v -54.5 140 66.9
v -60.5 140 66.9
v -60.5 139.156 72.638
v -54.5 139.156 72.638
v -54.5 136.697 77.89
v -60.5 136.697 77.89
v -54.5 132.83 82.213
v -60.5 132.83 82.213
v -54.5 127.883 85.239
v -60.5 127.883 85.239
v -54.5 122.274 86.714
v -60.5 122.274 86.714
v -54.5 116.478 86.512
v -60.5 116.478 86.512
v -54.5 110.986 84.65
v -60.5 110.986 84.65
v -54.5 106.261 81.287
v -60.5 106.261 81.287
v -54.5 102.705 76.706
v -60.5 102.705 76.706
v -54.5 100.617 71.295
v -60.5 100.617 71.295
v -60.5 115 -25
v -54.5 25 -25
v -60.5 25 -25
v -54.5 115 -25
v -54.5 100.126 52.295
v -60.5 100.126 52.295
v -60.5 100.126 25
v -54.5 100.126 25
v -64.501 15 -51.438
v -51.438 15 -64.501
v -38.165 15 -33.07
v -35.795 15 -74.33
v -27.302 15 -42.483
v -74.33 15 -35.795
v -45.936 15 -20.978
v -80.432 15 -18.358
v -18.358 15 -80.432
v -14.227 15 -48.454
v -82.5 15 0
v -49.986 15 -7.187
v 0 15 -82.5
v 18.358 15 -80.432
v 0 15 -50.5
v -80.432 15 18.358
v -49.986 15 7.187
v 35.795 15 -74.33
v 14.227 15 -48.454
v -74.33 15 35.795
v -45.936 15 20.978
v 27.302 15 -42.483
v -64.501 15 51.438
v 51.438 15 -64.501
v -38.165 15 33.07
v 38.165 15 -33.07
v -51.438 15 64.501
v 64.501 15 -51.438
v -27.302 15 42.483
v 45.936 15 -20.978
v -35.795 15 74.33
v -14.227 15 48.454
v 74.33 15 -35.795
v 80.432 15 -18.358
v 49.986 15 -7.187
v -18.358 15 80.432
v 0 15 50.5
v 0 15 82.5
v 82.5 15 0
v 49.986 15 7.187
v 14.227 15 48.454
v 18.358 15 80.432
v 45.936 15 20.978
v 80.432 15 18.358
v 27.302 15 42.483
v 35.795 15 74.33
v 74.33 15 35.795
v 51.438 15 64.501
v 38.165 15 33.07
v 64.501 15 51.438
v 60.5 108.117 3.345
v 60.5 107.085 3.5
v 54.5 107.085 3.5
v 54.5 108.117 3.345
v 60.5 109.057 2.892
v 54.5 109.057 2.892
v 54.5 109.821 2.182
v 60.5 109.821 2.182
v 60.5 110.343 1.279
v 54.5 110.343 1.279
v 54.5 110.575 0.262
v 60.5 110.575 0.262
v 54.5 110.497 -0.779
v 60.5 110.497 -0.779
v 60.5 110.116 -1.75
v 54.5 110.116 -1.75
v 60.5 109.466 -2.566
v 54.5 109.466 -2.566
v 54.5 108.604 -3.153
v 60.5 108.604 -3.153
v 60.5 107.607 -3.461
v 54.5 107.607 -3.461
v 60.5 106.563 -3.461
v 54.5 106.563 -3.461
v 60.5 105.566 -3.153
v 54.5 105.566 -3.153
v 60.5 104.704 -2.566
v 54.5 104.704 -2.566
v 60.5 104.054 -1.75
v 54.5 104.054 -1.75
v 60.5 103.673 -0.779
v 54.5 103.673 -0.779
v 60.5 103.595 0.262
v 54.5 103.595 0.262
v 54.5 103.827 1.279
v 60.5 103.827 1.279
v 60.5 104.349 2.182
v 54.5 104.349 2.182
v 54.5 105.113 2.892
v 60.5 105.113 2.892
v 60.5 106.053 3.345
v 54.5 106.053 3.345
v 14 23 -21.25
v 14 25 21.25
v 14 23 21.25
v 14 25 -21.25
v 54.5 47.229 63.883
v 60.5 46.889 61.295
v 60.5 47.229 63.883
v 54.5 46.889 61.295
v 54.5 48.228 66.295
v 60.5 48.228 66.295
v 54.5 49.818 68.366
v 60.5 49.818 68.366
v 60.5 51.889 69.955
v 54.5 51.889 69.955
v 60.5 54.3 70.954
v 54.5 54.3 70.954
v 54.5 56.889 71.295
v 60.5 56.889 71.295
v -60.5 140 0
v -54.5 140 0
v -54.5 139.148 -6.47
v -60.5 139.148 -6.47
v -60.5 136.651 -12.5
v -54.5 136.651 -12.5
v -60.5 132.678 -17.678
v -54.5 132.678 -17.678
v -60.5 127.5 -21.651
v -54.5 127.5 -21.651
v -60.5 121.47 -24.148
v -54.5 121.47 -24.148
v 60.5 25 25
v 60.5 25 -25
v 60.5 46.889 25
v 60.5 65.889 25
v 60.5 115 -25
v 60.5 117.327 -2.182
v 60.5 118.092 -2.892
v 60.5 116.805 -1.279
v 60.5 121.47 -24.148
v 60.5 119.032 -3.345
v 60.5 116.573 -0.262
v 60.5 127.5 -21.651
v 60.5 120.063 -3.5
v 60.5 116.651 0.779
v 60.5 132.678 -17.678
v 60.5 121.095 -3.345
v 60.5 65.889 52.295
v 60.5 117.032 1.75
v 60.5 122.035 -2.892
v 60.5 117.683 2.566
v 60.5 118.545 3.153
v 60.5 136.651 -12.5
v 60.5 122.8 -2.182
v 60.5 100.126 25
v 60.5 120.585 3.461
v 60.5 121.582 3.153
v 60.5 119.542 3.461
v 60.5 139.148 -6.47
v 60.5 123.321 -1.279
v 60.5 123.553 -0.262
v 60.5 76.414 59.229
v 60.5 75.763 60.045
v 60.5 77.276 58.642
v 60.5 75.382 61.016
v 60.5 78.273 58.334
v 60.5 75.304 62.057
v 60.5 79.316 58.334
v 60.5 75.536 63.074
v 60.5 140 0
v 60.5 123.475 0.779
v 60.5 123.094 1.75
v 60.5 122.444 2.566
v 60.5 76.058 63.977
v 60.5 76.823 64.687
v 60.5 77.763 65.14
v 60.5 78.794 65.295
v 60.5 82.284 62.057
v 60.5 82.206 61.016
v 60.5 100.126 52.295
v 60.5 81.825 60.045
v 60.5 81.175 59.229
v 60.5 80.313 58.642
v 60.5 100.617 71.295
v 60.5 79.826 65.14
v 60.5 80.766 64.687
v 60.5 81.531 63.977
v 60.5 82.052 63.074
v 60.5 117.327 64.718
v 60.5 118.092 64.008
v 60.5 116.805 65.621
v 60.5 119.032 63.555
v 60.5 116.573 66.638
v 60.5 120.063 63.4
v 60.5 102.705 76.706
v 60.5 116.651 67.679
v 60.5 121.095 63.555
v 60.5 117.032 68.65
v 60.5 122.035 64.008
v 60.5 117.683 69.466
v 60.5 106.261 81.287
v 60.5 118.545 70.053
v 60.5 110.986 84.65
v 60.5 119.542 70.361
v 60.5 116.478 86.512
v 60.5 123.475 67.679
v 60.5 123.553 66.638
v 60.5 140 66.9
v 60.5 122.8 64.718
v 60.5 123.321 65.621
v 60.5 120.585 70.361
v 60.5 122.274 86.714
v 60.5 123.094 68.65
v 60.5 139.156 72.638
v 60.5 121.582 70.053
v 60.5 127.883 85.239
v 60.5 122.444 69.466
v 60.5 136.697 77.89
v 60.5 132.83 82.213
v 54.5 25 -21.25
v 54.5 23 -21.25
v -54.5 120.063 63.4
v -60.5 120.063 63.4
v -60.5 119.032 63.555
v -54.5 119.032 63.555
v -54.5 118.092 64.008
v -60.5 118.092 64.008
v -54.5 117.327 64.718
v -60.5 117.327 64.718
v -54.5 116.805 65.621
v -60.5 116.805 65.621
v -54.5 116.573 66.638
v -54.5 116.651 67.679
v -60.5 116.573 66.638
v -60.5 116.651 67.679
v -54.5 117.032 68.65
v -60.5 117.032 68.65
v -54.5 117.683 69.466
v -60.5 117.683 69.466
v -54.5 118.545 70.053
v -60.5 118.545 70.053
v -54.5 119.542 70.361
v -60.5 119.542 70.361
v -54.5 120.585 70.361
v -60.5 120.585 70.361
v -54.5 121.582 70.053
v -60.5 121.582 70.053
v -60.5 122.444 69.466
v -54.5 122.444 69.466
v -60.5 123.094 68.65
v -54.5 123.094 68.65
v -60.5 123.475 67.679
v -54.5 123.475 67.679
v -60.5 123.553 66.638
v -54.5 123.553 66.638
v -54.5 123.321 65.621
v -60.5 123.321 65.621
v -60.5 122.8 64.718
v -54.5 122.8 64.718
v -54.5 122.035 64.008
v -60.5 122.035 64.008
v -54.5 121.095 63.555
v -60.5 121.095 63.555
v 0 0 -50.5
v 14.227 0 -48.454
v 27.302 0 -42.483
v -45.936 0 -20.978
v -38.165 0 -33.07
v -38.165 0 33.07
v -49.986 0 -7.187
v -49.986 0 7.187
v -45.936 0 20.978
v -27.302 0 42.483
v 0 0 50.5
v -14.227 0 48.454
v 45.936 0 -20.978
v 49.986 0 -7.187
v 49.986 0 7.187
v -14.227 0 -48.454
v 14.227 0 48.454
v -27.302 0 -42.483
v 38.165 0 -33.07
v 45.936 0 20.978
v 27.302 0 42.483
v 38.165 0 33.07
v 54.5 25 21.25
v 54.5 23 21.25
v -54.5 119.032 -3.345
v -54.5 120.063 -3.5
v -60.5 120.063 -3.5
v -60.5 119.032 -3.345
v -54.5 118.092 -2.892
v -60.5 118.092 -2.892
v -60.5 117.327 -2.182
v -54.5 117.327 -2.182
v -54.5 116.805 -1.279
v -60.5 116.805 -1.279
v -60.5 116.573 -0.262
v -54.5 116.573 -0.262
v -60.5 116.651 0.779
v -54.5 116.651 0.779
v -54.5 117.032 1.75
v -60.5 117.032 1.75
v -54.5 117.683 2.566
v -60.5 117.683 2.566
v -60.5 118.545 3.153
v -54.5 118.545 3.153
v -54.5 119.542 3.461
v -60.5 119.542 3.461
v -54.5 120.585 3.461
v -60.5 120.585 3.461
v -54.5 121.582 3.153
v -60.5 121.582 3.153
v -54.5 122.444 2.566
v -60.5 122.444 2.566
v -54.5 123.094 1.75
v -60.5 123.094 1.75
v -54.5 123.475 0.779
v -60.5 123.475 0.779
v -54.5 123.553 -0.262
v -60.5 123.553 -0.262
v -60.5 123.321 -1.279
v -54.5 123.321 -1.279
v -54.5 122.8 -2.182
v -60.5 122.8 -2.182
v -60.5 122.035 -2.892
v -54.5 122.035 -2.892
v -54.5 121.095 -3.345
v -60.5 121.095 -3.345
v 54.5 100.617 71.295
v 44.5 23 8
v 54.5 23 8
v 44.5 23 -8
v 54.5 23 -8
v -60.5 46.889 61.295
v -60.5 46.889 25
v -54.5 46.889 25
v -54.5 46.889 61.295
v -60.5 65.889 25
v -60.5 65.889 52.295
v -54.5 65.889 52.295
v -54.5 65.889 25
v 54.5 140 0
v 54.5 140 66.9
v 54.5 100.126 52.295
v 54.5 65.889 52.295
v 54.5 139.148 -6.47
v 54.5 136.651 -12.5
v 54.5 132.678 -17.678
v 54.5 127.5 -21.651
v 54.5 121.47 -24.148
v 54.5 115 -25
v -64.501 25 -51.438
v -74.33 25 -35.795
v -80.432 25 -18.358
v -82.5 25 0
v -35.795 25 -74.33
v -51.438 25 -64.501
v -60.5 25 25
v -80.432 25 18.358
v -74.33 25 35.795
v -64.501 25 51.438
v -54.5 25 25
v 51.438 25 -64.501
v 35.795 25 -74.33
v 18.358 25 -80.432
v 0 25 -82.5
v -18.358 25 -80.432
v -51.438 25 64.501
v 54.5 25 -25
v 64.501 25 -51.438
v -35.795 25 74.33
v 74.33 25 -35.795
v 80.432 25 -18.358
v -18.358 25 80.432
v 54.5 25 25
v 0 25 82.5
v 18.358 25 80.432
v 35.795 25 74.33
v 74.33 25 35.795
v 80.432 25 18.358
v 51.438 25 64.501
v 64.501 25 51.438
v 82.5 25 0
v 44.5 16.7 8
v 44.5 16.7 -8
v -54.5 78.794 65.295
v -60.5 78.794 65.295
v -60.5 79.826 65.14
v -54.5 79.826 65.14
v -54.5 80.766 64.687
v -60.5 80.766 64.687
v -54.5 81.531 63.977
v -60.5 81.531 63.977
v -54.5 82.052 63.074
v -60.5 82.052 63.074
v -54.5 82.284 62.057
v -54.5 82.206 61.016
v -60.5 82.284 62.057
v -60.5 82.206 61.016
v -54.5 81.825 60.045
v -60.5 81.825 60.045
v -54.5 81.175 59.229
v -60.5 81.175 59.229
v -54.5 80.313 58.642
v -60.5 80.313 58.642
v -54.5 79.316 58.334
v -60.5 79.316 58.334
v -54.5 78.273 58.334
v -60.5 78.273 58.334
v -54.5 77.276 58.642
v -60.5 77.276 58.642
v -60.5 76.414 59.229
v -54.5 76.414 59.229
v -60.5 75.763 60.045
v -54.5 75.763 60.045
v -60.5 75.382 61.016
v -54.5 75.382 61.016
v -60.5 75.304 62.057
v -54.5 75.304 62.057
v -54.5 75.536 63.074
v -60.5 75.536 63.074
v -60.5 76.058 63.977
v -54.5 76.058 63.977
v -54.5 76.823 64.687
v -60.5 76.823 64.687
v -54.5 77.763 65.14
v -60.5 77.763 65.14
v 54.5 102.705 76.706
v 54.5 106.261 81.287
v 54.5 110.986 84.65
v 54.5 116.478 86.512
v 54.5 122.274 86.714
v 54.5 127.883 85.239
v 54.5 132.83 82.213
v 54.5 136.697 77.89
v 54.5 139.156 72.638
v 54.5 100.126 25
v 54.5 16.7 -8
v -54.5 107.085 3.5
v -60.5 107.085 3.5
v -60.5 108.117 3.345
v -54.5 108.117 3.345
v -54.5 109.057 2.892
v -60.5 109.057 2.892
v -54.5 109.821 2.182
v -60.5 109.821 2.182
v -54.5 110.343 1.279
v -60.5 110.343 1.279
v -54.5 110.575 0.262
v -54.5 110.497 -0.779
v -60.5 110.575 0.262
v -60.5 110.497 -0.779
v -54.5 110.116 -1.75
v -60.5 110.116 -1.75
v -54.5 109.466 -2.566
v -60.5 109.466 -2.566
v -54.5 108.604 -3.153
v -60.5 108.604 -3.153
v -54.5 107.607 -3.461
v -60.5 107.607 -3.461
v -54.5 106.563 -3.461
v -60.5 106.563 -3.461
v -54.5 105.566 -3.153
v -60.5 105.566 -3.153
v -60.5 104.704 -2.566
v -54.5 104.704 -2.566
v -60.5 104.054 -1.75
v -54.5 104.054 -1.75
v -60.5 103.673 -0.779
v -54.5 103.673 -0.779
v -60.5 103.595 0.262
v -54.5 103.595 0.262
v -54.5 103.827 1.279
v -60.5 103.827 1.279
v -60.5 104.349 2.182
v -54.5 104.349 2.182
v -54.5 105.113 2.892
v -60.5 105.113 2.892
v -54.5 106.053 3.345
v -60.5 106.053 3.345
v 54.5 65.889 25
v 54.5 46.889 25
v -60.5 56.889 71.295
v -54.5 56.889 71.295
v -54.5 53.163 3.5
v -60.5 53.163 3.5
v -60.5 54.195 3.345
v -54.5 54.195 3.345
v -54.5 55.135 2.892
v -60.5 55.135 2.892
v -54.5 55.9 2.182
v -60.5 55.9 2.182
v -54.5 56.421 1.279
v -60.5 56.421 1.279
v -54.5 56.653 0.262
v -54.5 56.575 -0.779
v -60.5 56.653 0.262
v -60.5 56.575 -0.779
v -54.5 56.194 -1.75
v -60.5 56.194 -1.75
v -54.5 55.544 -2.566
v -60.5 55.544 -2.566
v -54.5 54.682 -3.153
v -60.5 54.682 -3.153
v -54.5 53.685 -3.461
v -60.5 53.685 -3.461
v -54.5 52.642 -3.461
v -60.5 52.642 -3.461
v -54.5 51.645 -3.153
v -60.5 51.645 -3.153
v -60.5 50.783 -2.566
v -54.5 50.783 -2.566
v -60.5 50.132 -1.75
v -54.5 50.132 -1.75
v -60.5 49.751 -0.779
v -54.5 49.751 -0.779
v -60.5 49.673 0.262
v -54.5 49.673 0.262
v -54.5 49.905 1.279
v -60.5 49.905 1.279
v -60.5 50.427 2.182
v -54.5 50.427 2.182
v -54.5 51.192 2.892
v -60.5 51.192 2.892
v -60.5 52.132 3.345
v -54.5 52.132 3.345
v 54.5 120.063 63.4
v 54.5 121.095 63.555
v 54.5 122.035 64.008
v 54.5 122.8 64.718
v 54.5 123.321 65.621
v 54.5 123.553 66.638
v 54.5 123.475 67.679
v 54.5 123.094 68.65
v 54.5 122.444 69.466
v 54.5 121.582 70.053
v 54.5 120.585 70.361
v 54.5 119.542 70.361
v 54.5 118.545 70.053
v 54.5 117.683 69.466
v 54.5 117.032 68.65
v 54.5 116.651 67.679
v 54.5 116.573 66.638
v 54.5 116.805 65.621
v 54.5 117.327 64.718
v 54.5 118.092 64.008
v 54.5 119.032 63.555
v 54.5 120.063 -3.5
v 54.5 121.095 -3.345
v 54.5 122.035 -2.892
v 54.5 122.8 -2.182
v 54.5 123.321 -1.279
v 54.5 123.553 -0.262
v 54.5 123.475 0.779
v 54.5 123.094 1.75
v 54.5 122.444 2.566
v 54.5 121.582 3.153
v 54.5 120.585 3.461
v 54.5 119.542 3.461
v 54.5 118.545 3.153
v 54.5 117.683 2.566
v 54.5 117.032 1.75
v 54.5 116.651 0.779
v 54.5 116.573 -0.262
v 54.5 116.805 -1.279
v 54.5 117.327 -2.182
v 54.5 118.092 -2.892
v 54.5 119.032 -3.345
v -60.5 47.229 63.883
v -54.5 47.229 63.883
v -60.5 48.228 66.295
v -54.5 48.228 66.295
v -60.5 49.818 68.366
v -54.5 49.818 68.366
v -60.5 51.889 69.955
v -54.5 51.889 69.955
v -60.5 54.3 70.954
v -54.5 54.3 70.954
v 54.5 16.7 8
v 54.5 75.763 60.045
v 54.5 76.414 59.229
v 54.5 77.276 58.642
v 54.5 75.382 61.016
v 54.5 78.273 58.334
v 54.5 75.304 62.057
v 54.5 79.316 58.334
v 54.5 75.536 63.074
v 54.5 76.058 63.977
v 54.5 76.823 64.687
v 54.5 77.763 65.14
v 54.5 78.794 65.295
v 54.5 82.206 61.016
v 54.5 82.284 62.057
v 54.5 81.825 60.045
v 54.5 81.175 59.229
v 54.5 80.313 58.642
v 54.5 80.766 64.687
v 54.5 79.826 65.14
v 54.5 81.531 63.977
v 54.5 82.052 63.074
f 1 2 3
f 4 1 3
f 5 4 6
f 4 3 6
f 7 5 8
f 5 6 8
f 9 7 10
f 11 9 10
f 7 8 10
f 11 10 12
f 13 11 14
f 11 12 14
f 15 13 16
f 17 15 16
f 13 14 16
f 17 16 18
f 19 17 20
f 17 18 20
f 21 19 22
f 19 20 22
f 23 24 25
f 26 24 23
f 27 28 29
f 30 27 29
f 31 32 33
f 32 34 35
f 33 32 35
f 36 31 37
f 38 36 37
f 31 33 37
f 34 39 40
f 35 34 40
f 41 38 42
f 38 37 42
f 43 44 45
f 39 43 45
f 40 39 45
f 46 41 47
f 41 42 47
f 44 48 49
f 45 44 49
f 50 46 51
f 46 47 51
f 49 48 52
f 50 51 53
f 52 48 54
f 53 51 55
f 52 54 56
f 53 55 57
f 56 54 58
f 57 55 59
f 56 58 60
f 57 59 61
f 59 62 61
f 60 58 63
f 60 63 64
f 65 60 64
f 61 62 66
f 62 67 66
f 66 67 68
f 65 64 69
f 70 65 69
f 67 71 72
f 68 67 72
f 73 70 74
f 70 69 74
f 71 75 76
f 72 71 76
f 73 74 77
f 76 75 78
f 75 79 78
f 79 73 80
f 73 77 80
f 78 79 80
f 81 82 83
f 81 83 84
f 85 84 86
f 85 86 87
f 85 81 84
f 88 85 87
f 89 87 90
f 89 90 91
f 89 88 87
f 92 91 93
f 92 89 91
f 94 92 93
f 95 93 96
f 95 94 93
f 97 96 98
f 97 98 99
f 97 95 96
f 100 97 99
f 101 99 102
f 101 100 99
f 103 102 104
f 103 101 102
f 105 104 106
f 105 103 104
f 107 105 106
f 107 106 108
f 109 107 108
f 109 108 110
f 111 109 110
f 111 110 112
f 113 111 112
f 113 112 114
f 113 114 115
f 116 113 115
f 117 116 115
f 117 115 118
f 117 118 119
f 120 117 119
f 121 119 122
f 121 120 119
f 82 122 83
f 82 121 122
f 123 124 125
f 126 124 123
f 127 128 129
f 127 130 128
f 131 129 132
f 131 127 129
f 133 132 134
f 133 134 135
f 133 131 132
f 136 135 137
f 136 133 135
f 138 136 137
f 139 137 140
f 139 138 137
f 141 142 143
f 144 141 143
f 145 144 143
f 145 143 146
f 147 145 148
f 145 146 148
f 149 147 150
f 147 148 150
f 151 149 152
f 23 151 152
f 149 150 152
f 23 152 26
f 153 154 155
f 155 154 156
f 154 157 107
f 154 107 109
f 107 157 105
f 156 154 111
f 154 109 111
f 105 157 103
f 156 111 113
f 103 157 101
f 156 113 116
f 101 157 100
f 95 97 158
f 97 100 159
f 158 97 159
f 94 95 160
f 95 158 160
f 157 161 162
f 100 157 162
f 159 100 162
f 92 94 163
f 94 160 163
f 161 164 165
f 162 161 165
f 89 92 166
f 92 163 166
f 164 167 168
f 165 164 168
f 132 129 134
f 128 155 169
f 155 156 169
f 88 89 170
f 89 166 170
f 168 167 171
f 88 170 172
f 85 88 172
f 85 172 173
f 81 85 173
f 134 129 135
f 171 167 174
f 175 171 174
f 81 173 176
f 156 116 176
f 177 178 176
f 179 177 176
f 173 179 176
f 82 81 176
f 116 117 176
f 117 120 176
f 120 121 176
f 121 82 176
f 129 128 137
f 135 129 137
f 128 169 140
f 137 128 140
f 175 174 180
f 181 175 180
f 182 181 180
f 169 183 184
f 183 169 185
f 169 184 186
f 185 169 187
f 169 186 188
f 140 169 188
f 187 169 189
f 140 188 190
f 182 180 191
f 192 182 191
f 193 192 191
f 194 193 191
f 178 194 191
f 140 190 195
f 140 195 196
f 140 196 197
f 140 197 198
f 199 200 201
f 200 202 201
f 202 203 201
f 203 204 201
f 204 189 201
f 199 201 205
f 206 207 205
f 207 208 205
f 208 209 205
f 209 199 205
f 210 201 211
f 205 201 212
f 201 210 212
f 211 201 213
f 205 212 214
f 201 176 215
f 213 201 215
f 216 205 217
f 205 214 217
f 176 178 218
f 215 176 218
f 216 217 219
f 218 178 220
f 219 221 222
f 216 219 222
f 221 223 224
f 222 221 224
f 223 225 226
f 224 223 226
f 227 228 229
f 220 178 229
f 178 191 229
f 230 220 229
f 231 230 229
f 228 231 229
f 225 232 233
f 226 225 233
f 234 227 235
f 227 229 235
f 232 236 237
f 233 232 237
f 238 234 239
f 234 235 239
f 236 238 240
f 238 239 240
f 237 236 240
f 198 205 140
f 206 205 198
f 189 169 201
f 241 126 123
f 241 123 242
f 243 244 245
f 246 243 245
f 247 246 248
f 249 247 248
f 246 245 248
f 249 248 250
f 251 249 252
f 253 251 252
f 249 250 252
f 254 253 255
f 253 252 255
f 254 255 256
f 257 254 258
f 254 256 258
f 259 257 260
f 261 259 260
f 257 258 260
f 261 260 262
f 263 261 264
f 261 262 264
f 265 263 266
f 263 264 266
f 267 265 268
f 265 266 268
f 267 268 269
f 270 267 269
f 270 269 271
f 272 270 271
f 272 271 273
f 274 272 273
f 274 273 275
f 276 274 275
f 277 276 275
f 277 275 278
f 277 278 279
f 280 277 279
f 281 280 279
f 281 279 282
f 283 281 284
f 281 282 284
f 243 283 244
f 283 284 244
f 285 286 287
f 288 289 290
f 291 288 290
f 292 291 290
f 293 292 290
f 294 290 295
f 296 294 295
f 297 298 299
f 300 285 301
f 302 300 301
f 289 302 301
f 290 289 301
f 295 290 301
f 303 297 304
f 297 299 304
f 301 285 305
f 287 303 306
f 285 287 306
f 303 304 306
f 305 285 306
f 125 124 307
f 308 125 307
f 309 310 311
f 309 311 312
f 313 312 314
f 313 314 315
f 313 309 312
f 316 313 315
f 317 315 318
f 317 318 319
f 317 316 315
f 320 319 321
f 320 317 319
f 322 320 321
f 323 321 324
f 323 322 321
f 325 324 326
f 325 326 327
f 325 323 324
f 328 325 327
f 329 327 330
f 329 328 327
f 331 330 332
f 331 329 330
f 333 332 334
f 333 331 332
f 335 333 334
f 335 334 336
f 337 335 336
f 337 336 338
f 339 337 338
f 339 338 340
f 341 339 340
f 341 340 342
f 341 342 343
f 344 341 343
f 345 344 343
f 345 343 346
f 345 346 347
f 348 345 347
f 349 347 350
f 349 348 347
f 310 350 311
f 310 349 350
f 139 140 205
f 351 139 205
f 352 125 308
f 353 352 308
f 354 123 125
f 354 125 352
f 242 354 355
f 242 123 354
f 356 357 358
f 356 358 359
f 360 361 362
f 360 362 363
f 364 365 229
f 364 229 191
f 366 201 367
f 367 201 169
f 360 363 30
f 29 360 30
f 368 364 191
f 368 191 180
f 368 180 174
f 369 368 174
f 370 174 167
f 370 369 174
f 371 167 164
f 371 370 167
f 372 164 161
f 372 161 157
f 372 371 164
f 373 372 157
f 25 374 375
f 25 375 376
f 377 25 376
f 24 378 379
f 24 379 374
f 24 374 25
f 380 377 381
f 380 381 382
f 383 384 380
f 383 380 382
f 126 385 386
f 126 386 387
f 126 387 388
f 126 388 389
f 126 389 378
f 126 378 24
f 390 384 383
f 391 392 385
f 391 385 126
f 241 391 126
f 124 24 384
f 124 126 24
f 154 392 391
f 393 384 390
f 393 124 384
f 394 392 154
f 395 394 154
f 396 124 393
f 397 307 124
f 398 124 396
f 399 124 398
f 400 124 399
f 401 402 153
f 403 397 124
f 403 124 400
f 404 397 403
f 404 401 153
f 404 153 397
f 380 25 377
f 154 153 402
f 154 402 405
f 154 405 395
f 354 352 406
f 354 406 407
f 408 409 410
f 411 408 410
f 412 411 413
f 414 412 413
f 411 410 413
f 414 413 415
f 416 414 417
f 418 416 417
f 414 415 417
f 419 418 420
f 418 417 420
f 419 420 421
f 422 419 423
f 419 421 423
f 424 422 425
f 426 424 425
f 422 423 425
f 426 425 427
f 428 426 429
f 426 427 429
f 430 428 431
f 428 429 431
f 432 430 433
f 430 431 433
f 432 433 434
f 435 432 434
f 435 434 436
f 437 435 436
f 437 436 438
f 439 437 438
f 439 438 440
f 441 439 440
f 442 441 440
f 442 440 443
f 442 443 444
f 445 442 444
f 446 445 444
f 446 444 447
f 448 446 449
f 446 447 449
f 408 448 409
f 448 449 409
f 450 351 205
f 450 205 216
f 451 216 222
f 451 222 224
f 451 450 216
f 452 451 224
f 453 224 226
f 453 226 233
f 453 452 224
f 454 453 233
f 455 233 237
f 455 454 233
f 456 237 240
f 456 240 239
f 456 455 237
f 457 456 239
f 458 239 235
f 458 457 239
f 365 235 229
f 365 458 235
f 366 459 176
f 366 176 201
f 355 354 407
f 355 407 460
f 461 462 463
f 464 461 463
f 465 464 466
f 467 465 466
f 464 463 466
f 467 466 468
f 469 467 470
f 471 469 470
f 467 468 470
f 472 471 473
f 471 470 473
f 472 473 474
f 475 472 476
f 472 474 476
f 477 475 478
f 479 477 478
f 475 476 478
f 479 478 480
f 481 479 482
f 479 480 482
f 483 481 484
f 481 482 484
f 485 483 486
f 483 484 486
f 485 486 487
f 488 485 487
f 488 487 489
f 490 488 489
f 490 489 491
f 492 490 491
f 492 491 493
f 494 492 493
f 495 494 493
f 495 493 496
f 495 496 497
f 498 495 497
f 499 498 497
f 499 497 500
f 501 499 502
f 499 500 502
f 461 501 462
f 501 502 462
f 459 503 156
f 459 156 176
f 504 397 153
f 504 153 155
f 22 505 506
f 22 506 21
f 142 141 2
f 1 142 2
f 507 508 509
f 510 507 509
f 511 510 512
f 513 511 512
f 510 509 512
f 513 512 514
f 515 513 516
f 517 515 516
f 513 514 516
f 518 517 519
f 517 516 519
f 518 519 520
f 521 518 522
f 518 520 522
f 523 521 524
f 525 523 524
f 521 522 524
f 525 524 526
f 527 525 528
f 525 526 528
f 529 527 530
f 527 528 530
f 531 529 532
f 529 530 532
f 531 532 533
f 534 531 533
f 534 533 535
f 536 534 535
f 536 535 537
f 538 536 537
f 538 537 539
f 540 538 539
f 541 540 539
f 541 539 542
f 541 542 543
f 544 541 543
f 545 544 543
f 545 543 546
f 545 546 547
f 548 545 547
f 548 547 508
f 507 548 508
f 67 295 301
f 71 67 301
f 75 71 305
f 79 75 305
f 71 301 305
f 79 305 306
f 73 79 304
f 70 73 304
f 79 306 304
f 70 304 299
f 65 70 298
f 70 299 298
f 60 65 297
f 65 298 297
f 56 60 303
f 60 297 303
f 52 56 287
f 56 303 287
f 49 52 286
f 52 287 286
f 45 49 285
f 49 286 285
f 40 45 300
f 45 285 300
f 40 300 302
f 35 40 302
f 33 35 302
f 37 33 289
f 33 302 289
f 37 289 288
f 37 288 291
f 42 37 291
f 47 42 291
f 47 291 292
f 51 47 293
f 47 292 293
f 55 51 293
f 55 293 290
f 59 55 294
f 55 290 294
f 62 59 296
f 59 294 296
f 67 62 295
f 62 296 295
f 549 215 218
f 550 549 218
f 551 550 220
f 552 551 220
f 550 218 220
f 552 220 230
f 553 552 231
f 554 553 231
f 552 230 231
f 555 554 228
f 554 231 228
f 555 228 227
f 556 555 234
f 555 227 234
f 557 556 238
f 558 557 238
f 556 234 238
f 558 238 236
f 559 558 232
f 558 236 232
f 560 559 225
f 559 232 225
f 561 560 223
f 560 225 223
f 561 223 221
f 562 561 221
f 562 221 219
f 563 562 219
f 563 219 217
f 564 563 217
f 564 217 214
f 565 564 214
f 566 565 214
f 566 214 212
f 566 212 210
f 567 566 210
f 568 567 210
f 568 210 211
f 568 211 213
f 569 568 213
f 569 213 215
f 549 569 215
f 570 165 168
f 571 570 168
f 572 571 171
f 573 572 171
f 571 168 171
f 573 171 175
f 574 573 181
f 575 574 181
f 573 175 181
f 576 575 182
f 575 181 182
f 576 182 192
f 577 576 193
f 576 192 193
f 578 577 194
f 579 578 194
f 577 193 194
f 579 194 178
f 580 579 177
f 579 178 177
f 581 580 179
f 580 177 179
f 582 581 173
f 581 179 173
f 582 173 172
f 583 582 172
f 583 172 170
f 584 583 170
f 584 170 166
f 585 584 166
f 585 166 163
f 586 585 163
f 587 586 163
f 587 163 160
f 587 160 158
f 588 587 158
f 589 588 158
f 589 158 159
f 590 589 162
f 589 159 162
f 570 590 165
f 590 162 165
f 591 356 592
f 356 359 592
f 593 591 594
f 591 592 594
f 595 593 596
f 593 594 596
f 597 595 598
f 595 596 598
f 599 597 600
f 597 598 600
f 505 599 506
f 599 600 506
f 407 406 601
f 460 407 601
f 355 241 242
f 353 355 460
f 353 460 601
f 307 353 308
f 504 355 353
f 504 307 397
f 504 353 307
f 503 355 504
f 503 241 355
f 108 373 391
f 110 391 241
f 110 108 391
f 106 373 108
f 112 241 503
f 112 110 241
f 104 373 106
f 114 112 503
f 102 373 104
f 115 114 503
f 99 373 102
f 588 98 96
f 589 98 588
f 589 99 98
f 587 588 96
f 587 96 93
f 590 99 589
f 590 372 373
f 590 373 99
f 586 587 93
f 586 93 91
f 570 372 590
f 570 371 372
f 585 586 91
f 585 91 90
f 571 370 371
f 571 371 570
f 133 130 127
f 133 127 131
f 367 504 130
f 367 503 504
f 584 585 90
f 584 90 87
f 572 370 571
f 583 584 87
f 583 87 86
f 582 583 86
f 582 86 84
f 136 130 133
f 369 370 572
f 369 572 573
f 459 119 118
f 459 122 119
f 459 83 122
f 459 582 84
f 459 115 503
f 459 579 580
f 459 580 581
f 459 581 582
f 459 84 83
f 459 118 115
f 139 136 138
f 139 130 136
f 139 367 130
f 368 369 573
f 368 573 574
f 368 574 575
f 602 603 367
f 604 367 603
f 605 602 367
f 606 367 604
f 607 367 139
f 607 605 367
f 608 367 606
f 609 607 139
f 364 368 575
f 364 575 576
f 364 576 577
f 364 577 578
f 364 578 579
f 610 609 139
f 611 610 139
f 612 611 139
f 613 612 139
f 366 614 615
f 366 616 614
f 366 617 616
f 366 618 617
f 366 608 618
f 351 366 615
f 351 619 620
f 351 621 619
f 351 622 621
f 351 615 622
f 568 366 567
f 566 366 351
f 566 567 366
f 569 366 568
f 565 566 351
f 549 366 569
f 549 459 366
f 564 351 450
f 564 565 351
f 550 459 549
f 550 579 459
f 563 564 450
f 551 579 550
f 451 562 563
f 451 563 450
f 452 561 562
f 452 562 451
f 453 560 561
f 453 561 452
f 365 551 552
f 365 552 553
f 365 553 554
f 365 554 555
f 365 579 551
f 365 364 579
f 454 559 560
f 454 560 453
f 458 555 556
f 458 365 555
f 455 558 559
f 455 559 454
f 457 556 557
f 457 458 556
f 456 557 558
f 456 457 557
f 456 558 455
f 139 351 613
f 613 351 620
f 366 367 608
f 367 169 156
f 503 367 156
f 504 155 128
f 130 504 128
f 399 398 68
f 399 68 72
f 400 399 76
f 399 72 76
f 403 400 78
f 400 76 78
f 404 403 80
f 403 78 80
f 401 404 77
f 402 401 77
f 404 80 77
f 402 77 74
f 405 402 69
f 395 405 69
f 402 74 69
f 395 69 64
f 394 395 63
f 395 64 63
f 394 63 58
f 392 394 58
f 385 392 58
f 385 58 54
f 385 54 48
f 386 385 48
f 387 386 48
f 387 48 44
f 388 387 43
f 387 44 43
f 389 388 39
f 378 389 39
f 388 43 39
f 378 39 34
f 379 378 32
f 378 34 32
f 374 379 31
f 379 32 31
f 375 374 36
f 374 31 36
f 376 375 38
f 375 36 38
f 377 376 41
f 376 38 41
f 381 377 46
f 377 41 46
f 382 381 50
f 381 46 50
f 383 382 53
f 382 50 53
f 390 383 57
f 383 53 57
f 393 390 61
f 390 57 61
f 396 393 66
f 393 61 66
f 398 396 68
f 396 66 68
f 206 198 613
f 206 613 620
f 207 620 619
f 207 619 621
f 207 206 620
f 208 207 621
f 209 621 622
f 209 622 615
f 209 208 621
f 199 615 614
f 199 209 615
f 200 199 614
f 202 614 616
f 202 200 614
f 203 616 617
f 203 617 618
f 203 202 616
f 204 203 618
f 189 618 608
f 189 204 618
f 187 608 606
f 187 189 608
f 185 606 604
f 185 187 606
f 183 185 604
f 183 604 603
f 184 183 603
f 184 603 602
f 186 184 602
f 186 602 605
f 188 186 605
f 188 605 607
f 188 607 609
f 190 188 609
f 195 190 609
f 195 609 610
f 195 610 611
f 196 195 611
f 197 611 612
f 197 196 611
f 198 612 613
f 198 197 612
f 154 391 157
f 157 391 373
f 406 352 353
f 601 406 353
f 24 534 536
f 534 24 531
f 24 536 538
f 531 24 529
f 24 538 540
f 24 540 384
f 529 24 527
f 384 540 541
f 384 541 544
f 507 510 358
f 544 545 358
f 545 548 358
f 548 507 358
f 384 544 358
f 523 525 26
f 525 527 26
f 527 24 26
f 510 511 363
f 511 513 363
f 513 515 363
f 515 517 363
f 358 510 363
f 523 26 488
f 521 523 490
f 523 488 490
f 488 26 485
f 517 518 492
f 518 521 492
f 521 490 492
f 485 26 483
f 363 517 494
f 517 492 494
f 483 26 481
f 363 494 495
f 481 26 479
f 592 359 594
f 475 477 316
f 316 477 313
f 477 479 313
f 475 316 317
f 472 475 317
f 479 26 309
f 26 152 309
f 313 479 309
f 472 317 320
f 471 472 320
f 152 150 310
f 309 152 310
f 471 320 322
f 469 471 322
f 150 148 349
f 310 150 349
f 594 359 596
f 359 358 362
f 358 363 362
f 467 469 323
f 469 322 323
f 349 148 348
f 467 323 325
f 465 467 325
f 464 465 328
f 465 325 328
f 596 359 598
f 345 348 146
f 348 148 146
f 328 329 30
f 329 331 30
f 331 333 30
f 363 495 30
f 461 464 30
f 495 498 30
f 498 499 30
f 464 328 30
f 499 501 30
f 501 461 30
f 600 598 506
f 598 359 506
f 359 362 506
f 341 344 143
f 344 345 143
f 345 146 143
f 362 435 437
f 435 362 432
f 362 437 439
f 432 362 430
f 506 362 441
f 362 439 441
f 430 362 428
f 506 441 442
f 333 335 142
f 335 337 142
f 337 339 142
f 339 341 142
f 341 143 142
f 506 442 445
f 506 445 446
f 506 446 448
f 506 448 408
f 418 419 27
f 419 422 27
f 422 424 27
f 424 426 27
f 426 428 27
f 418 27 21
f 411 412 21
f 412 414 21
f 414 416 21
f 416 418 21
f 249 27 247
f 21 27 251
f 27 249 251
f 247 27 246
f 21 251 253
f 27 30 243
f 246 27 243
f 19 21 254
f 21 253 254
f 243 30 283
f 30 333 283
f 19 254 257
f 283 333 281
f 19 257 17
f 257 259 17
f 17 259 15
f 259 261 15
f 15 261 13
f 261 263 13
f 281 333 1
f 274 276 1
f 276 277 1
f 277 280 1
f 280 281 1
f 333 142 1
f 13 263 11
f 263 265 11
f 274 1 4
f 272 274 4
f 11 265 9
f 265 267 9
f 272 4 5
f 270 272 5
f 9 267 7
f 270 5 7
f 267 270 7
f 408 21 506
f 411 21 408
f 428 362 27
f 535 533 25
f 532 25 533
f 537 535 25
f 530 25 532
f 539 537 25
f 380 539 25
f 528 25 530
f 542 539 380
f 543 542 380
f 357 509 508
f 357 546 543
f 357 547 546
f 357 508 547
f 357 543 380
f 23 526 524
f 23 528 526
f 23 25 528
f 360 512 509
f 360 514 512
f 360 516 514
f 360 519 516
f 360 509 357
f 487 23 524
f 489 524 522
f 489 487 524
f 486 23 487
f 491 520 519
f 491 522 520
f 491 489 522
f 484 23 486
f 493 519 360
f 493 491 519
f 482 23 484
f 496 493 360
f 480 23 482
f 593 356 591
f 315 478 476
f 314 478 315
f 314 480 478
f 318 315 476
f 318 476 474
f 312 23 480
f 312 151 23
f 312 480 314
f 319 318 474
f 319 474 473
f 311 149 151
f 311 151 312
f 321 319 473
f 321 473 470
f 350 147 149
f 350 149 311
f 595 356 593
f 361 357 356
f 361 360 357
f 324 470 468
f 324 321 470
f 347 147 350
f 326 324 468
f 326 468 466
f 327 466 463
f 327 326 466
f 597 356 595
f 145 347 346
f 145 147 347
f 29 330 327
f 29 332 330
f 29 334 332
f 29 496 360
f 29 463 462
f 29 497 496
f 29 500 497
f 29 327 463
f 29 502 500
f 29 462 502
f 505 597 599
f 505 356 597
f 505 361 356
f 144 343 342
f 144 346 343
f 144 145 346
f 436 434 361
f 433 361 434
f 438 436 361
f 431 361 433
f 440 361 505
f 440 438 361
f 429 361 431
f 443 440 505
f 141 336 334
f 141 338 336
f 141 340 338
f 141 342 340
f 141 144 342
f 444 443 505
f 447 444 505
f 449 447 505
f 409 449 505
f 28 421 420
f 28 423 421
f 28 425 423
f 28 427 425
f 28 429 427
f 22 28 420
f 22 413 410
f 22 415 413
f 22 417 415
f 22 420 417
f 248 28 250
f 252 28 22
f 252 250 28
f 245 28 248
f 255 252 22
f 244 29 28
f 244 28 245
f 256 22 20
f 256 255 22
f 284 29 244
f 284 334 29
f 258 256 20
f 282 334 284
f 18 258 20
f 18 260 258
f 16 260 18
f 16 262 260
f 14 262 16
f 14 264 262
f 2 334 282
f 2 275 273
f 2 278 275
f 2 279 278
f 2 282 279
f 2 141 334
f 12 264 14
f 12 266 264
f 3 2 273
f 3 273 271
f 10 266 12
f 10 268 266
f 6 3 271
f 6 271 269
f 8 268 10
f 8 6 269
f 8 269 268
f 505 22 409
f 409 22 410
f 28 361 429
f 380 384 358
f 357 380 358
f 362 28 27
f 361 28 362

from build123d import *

# Parameters (mm, degrees)
ESQUISSE1_R             = 50.5
BOSS_EXTRU_1_DEPTH      = 15
ESQUISSE2_R             = 82.5
BOSS_EXTRU_2_DEPTH      = 10
ESQUISSE3_W             = 40.5
ESQUISSE3_H             = 42.5
ENL_V_MAT_EXTRU_1_DEPTH = 2
ESQUISSE4_W             = 10
ESQUISSE4_H             = 16
ENL_V_MAT_EXTRU_2_DEPTH = 6.3
ESQUISSE5_W             = 50
ESQUISSE5_H             = 90
BOSS_EXTRU_3_DEPTH      = 6
BOSS_EXTRU_4_DEPTH      = 6
ESQUISSE7_R             = 3.5
ENL_V_MAT_EXTRU_3_DEPTH = 10
ESQUISSE8_R             = 3.5
ENL_V_MAT_EXTRU_4_DEPTH = 6
ESQUISSE9_R             = 3.5
BOSS_EXTRU_5_DEPTH      = 6
ENL_V_START             = -6
ESQUISSE10_R            = 3.5
ENL_V_MAT_EXTRU_5_DEPTH = 6
ESQUISSE13_R            = 3.5
ENL_V_MAT_EXTRU_6_DEPTH = 10
ESQUISSE17_R            = 3.5
ENL_V_MAT_EXTRU_7_DEPTH = 6
ESQUISSE19_R            = 3.5
BOSS_EXTRU_8_DEPTH      = 6
CONG_1_R                = 10
CONG_1_OF_SYM_TRIE4_R   = 10


with BuildPart() as part:
    # Esquisse1 → Boss.-Extru.1 (new body)
    with BuildSketch(Plane(origin=(0, 0, 0), x_dir=(1, 0, 0), z_dir=(0, 1, 0))):
        with Locations(Location((0, 0, 0), (0, 0, 270))):
            Circle(ESQUISSE1_R)
    extrude(amount=BOSS_EXTRU_1_DEPTH)

    # Esquisse2 → Boss.-Extru.2 (add)
    with BuildSketch(Plane(origin=(0, 15, 0), x_dir=(1, 0, 0), z_dir=(0, 1, 0))):
        with Locations(Location((0, 0, 0), (0, 0, 270))):
            Circle(ESQUISSE2_R)
    extrude(amount=BOSS_EXTRU_2_DEPTH)

    # Esquisse3 → Enlèv. mat.-Extru.1 (cut)
    with BuildSketch(Plane(origin=(0, 25, 0), x_dir=(1, 0, 0), z_dir=(0, 1, 0))):
        with Locations((34.25, 0)):
            Rectangle(ESQUISSE3_W, ESQUISSE3_H)
    extrude(amount=-ENL_V_MAT_EXTRU_1_DEPTH, mode=Mode.SUBTRACT)

    # Esquisse4 → Enlèv. mat.-Extru.2 (cut)
    with BuildSketch(Plane(origin=(0, 23, 0), x_dir=(1, 0, 0), z_dir=(0, 1, 0))):
        with Locations((49.5, 0)):
            Rectangle(ESQUISSE4_W, ESQUISSE4_H)
    extrude(amount=-ENL_V_MAT_EXTRU_2_DEPTH, mode=Mode.SUBTRACT)

    # Esquisse5 → Boss.-Extru.3 (add)
    with BuildSketch(Plane.ZY.offset(-54.5)):
        with Locations((0, 70)):
            Rectangle(ESQUISSE5_W, ESQUISSE5_H)
        with BuildLine():
            ThreePointArc((25, 115), (0, 140), (-25, 115))
            Line((-25, 115), (25, 115))
        make_face()
    boss_extru_3 = extrude(amount=-BOSS_EXTRU_3_DEPTH)

    # Symétrie1: Boss.-Extru.3 across plane
    add(boss_extru_3.mirror(Plane(origin=(0, 0, 0), x_dir=(0, 0, 1), z_dir=(1, 0, 0))))

    # Esquisse6 → Boss.-Extru.4 (add)
    with BuildSketch(Plane.ZY.offset(-54.5)):
        with BuildLine():
            Line((66.9, 140), (0, 140))
            ThreePointArc((0, 140), (17.67766953, 132.67766953), (25, 115))
            Line((25, 115), (25, 100.126441606))
            Line((25, 100.126441606), (66.9, 100.126441606))
            Line((66.9, 100.126441606), (66.9, 140))
        make_face()
        with BuildLine():
            Line((66.9, 140), (66.9, 100.126441606))
            ThreePointArc((66.9, 100.126441606), (86.836779197, 120.063220803), (66.9, 140))
        make_face()
    extrude(amount=-BOSS_EXTRU_4_DEPTH)

    # Esquisse7 → Enlèv. mat.-Extru.3 (cut)
    with BuildSketch(Plane(origin=(60.5, 0, 0), x_dir=(0, 0, -1), z_dir=(1, 0, 0))):
        with Locations((-66.9, 120.063220803)):
            Circle(ESQUISSE7_R)
    extrude(amount=-ENL_V_MAT_EXTRU_3_DEPTH, mode=Mode.SUBTRACT)

    # Esquisse8 → Enlèv. mat.-Extru.4 (cut)
    with BuildSketch(Plane(origin=(60.5, 0, 0), x_dir=(0, 0, -1), z_dir=(1, 0, 0))):
        with Locations((0, 120.063220803)):
            Circle(ESQUISSE8_R)
    extrude(amount=-ENL_V_MAT_EXTRU_4_DEPTH, mode=Mode.SUBTRACT)

    # Esquisse9 → Boss.-Extru.5 (add)
    with BuildSketch(Plane.ZY.offset(60.5)):
        with BuildLine():
            Line((0, 140), (66.9, 140))
            ThreePointArc((66.9, 140), (86.836779197, 120.063220803), (66.9, 100.126441606))
            Line((66.9, 100.126441606), (25, 100.126441606))
            Line((25, 100.126441606), (25, 115))
            ThreePointArc((25, 115), (17.67766953, 132.67766953), (0, 140))
        make_face()
        with Locations(Location((66.9, 120.063220803, 0), (0, 0, 180))):
            Circle(ESQUISSE9_R, mode=Mode.SUBTRACT)
    extrude(amount=-BOSS_EXTRU_5_DEPTH)

    # Esquisse10 → Enlèv. mat.-Extru.5 (cut)
    with BuildSketch(Plane.ZY.offset(60.5).offset(ENL_V_START)):
        with Locations(Location((0, 120.063220803, 0), (0, 0, 180))):
            Circle(ESQUISSE10_R)
    extrude(amount=ENL_V_MAT_EXTRU_5_DEPTH, mode=Mode.SUBTRACT)

    # Esquisse13 → Enlèv. mat.-Extru.6 (cut)
    with BuildSketch(Plane.ZY.offset(60.5)):
        with Locations((0, 53.163220803)):
            Circle(ESQUISSE13_R)
    extrude(amount=-ENL_V_MAT_EXTRU_6_DEPTH, mode=Mode.SUBTRACT)

    # Esquisse17 → Enlèv. mat.-Extru.7 (cut)
    with BuildSketch(Plane.ZY.offset(60.5)):
        with Locations((0, 107.085063293)):
            Circle(ESQUISSE17_R)
    enl_v_mat_extru_7 = extrude(amount=-ENL_V_MAT_EXTRU_7_DEPTH, mode=Mode.SUBTRACT)

    # Esquisse19 → Boss.-Extru.8 (add)
    # profile 1 of 2: a face of its own
    with BuildSketch(Plane.ZY.offset(60.5)):
        with Locations((0, 61.406086298)):
            Circle(ESQUISSE19_R)
    # profile 2 of 2: a face of its own
    with BuildSketch(Plane.ZY.offset(60.5)):
        with BuildLine():
            Line((25, 46.888681), (71.2950306, 46.888681))
            Line((71.2950306, 46.888681), (71.2950306, 100.616913422))
            ThreePointArc((71.2950306, 100.616913422), (69.111156744, 100.249438968), (66.9, 100.126441606))
            Line((66.9, 100.126441606), (52.2950306, 100.126441606))
            Line((52.2950306, 100.126441606), (52.2950306, 65.888681))
            Line((52.2950306, 65.888681), (25, 65.888681))
            Line((25, 65.888681), (25, 46.888681))
        make_face()
        with Locations((61.7950306, 78.794182581)):
            Circle(ESQUISSE19_R, mode=Mode.SUBTRACT)
    boss_extru_8 = extrude(amount=-BOSS_EXTRU_8_DEPTH)

    # Congé1
    cong_1_edges = [part.edges().sort_by_distance(p)[0] for p in [
        (-57.5, 46.888681, 71.2950306),
    ]]
    fillet(cong_1_edges, radius=CONG_1_R)

    # Symétrie4: Enlèv. mat.-Extru.7, Boss.-Extru.8 across plane
    add(enl_v_mat_extru_7.mirror(Plane(origin=(0, 0, 0), x_dir=(0, 0, 1), z_dir=(1, 0, 0))), mode=Mode.SUBTRACT)
    add(boss_extru_8.mirror(Plane(origin=(0, 0, 0), x_dir=(0, 0, 1), z_dir=(1, 0, 0))))

    # Congé1 of Symétrie4
    cong_1_of_sym_trie4_edges = [part.edges().sort_by_distance(p)[0] for p in [
        (57.5, 46.888681, 71.2950306),
    ]]
    fillet(cong_1_of_sym_trie4_edges, radius=CONG_1_OF_SYM_TRIE4_R)


solid = part.part
